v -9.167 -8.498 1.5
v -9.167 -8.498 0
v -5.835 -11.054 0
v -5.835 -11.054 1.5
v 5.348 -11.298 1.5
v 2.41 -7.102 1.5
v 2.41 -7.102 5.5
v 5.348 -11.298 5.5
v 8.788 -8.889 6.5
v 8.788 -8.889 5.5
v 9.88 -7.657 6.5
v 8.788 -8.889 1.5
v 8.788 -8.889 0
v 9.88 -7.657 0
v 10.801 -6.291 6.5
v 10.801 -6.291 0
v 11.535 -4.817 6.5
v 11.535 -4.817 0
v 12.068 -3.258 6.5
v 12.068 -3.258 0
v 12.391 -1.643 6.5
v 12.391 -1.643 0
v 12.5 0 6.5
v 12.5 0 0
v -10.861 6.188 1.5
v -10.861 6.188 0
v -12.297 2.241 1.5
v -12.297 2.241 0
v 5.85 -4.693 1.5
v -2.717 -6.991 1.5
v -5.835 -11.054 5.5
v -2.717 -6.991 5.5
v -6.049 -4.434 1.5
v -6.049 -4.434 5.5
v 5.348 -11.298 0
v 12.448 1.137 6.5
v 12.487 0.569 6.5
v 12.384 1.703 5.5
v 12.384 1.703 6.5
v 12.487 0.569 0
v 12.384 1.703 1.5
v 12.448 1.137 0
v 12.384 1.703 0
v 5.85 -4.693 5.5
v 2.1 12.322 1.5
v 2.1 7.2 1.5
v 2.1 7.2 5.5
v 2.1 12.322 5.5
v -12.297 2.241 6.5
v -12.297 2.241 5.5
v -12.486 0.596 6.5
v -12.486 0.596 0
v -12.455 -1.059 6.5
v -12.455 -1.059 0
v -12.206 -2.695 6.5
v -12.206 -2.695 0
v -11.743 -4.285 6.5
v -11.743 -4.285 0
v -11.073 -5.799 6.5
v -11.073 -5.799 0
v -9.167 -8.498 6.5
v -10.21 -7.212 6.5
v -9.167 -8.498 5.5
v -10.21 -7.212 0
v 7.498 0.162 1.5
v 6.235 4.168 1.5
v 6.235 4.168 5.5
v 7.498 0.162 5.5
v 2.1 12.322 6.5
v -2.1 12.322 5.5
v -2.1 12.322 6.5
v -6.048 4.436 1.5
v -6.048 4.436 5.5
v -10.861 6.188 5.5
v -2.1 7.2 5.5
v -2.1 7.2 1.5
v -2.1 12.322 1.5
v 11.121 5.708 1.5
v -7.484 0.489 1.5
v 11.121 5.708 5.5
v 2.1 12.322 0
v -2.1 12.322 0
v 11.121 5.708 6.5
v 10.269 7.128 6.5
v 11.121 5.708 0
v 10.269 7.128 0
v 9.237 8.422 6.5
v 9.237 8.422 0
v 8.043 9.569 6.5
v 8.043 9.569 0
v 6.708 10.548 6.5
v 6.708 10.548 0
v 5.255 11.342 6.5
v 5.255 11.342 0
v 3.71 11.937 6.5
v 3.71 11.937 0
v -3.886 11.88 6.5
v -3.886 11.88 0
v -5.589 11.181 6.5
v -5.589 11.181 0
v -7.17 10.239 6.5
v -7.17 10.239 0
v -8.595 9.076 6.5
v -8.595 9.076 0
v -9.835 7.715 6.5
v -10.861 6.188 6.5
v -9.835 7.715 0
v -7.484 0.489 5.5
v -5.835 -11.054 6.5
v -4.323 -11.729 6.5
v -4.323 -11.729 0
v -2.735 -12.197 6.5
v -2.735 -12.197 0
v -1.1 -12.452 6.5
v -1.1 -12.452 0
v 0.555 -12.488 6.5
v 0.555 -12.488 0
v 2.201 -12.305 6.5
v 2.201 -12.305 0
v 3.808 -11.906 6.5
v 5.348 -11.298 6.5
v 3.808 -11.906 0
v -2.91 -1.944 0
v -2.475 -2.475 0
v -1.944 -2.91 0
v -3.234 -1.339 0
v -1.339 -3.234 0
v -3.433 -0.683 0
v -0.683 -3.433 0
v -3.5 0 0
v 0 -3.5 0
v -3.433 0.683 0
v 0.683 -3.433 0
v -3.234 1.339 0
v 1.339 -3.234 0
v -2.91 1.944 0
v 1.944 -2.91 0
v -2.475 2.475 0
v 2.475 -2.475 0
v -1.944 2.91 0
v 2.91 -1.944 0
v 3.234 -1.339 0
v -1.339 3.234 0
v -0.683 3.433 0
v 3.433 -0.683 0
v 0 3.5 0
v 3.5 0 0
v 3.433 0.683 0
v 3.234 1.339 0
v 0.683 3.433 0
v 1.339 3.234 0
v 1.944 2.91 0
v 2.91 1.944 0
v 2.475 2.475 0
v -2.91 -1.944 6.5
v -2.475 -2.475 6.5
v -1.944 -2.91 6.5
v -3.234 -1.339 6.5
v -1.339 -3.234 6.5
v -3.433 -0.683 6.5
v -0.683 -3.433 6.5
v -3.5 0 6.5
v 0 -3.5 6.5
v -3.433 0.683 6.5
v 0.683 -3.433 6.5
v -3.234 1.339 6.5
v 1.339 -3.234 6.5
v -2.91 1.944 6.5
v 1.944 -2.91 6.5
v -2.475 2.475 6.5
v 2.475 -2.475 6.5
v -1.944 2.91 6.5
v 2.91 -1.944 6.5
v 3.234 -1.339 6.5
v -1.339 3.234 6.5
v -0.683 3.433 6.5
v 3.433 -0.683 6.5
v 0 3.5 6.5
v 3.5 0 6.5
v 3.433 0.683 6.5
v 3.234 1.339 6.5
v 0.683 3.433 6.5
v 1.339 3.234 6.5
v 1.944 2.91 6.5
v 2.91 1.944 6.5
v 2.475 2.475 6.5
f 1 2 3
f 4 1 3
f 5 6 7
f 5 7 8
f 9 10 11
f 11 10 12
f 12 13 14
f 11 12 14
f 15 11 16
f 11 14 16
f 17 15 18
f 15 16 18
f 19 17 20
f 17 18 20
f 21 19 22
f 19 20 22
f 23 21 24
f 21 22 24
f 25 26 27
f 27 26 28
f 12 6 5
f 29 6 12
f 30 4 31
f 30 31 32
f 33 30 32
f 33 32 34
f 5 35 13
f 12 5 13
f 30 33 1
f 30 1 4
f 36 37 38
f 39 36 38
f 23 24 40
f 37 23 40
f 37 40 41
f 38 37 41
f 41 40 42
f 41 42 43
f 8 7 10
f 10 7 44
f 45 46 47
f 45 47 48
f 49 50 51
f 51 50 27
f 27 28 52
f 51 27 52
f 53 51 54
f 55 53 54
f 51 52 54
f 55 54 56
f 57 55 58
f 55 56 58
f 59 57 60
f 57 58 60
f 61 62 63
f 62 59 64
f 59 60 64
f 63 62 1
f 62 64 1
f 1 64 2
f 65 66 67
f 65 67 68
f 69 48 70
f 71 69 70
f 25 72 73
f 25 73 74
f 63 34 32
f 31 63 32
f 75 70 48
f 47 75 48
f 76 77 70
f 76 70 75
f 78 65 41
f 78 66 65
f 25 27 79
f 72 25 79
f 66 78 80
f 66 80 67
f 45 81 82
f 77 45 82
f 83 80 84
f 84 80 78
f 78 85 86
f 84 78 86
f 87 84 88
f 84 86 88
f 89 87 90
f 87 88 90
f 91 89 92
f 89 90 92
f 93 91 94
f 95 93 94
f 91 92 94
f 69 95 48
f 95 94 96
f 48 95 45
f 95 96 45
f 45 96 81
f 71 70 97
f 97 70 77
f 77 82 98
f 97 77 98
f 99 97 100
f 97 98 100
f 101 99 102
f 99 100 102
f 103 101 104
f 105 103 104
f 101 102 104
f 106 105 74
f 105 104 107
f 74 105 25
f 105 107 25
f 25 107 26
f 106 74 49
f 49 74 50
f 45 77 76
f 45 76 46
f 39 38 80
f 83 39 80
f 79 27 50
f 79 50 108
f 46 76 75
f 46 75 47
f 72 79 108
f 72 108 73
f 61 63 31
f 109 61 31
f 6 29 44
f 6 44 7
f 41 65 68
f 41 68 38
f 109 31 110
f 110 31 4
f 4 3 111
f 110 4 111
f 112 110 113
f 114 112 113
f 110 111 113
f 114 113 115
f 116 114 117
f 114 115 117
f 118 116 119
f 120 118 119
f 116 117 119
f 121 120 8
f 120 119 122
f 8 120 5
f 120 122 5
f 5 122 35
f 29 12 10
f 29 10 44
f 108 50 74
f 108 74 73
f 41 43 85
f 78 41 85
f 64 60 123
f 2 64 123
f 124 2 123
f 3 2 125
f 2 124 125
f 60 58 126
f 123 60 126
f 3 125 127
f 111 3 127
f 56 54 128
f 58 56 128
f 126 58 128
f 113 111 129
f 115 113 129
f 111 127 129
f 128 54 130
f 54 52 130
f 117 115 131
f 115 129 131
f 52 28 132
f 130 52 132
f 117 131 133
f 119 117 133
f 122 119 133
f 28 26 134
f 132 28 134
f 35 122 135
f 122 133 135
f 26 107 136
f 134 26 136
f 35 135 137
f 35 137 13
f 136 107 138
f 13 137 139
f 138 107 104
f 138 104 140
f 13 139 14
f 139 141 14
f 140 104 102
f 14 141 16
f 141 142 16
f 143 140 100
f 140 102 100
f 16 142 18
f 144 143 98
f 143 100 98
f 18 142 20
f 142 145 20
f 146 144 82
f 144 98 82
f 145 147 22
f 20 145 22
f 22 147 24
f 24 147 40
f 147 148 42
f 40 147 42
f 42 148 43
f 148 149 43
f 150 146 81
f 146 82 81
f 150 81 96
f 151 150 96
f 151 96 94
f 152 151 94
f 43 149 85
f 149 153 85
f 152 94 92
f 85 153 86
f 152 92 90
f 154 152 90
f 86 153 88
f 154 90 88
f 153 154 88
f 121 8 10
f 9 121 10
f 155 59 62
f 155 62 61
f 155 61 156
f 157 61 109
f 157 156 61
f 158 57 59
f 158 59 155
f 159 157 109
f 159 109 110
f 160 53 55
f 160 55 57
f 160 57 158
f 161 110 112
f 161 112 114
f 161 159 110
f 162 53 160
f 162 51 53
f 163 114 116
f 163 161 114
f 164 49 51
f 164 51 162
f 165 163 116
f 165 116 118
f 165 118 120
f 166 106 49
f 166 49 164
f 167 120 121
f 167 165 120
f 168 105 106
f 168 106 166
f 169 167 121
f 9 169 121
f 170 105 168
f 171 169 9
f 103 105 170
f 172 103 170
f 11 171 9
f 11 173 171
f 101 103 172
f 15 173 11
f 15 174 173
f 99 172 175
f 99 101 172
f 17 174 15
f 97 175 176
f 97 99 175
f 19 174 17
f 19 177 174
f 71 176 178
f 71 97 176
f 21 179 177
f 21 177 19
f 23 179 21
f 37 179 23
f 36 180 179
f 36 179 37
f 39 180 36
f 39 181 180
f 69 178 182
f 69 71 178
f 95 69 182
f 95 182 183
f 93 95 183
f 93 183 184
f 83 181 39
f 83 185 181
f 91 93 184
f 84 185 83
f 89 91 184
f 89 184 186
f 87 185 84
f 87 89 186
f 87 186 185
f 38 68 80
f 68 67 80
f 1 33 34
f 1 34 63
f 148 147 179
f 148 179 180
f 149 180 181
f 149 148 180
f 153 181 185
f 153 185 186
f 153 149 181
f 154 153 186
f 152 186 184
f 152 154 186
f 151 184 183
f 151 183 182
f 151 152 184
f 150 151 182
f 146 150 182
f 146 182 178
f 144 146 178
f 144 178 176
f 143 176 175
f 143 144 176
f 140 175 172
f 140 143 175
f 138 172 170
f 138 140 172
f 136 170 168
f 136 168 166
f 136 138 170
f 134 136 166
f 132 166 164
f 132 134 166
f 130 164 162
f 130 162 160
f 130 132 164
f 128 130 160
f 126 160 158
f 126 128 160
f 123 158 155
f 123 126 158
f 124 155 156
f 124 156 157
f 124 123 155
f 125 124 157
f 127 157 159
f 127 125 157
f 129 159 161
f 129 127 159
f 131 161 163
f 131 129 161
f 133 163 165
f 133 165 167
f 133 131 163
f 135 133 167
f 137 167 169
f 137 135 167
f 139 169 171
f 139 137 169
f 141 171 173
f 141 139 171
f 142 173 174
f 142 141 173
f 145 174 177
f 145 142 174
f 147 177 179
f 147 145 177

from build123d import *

# Parameters (mm, degrees)
F0_R     = 3.5
F1_DEPTH = 6.5
F2_START = 1.5
F2_DEPTH = 4


with BuildPart() as f1:
    # F0 (on Top) → F1 (new body)
    with BuildSketch(Plane.XY):
        with BuildLine():
            Line((-9.1673866339, -8.4975892055), (-6.0491072211, -4.4337683552))
            ThreePointArc((-6.0491072211, -4.4337683552), (-7.2003739079, -2.0987176052), (-7.4840272858, 0.4892193627))
            Line((-7.4840272858, 0.4892193627), (-12.2974468195, 2.241160798))
            ThreePointArc((-12.2974468195, 2.241160798), (-12.0006231798, -3.4978626754), (-9.1673866339, -8.4975892055))
        make_face()
        with BuildLine():
            ThreePointArc((-6.0475616592, 4.4358762356), (-4.3018232726, 6.1436403322), (-2.0999722599, 7.2000080908))
            Line((-2.0999722599, 7.2000080908), (-2.0999722599, 12.3223421681))
            ThreePointArc((-2.0999722599, 12.3223421681), (-7.1697054544, 10.2394005536), (-10.8609811929, 6.1878176709))
            Line((-10.8609811929, 6.1878176709), (-6.0475616592, 4.4358762356))
        make_face()
        with BuildLine():
            ThreePointArc((2.0999722599, 7.2000080908), (4.4348223627, 6.048334532), (6.2352959244, 4.1678633297))
            Line((6.2352959244, 4.1678633297), (11.1205527613, 5.7081788938))
            ThreePointArc((11.1205527613, 5.7081788938), (7.3913706045, 10.0805575533), (2.0999722599, 12.3223421681))
            Line((2.0999722599, 12.3223421681), (2.0999722599, 7.2000080908))
        make_face()
        with BuildLine():
            ThreePointArc((7.4982435991, 0.1623050491), (7.4995608869, 0.0811572762), (7.5, 0))
            ThreePointArc((7.5, 0), (7.0754730103, -2.4875051115), (5.849951552, -4.6934067412))
            Line((5.849951552, -4.6934067412), (8.7880016779, -8.8893771722))
            ThreePointArc((8.7880016779, -8.8893771722), (11.5347306205, -4.8166367429), (12.5, 0))
            ThreePointArc((12.5, 0), (12.4708410993, 0.8533008116), (12.383500436, 1.7026206131))
            Line((12.383500436, 1.7026206131), (7.4982435991, 0.1623050491))
        make_face()
        with BuildLine():
            Line((5.3476085387, -11.2983663827), (2.4095584128, -7.1023959517))
            ThreePointArc((2.4095584128, -7.1023959517), (-0.1636116378, -7.4982152031), (-2.7170672074, -6.9905325828))
            Line((-2.7170672074, -6.9905325828), (-5.8353466201, -11.0543534331))
            ThreePointArc((-5.8353466201, -11.0543534331), (-0.2726860629, -12.4970253385), (5.3476085387, -11.2983663827))
        make_face()
        with BuildLine():
            ThreePointArc((-7.4840272858, 0.4892193627), (-7.0476946559, 2.5651510749), (-6.0475616592, 4.4358762356))
            Line((-6.0475616592, 4.4358762356), (-10.8609811929, 6.1878176709))
            Line((-10.8609811929, 6.1878176709), (-12.2974468195, 2.241160798))
            Line((-12.2974468195, 2.241160798), (-7.4840272858, 0.4892193627))
        make_face()
        with BuildLine():
            Line((8.7880016779, -8.8893771722), (5.849951552, -4.6934067412))
            ThreePointArc((5.849951552, -4.6934067412), (4.3018232726, -6.1436403322), (2.4095584128, -7.1023959517))
            Line((2.4095584128, -7.1023959517), (5.3476085387, -11.2983663827))
            Line((5.3476085387, -11.2983663827), (8.7880016779, -8.8893771722))
        make_face()
        with BuildLine():
            Line((-5.8353466201, -11.0543534331), (-2.7170672074, -6.9905325828))
            ThreePointArc((-2.7170672074, -6.9905325828), (-4.5657107176, -5.9501500522), (-6.0491072211, -4.4337683552))
            Line((-6.0491072211, -4.4337683552), (-9.1673866339, -8.4975892055))
            Line((-9.1673866339, -8.4975892055), (-5.8353466201, -11.0543534331))
        make_face()
        with BuildLine():
            Line((-7.4840272858, 0.4892193627), (-6.0475616592, 4.4358762356))
            ThreePointArc((-6.0475616592, 4.4358762356), (-7.0476946559, 2.5651510749), (-7.4840272858, 0.4892193627))
        make_face()
        with BuildLine():
            ThreePointArc((-2.0999722599, 7.2000080908), (0, 7.5), (2.0999722599, 7.2000080908))
            Line((2.0999722599, 7.2000080908), (2.0999722599, 12.3223421681))
            Line((2.0999722599, 12.3223421681), (-2.0999722599, 12.3223421681))
            Line((-2.0999722599, 12.3223421681), (-2.0999722599, 7.2000080908))
        make_face()
        with BuildLine():
            Line((-2.0999722599, 7.2000080908), (2.0999722599, 7.2000080908))
            ThreePointArc((2.0999722599, 7.2000080908), (0, 7.5), (-2.0999722599, 7.2000080908))
        make_face()
        with BuildLine():
            ThreePointArc((-6.0491072211, -4.4337683552), (-4.5657107176, -5.9501500522), (-2.7170672074, -6.9905325828))
            Line((-2.7170672074, -6.9905325828), (-6.0491072211, -4.4337683552))
        make_face()
        with BuildLine():
            ThreePointArc((5.849951552, -4.6934067412), (7.0754730103, -2.4875051115), (7.5, 0))
            ThreePointArc((7.5, 0), (7.4995608869, 0.0811572762), (7.4982435991, 0.1623050491))
            Line((7.4982435991, 0.1623050491), (6.2352959244, 4.1678633297))
            ThreePointArc((6.2352959244, 4.1678633297), (4.4348223627, 6.048334532), (2.0999722599, 7.2000080908))
            Line((2.0999722599, 7.2000080908), (-2.0999722599, 7.2000080908))
            ThreePointArc((-2.0999722599, 7.2000080908), (-4.3018232726, 6.1436403322), (-6.0475616592, 4.4358762356))
            Line((-6.0475616592, 4.4358762356), (-7.4840272858, 0.4892193627))
            ThreePointArc((-7.4840272858, 0.4892193627), (-7.2003739079, -2.0987176052), (-6.0491072211, -4.4337683552))
            Line((-6.0491072211, -4.4337683552), (-2.7170672074, -6.9905325828))
            ThreePointArc((-2.7170672074, -6.9905325828), (-0.1636116378, -7.4982152031), (2.4095584128, -7.1023959517))
            Line((2.4095584128, -7.1023959517), (5.849951552, -4.6934067412))
        make_face()
        Circle(F0_R, mode=Mode.SUBTRACT)
        with BuildLine():
            ThreePointArc((2.4095584128, -7.1023959517), (4.3018232726, -6.1436403322), (5.849951552, -4.6934067412))
            Line((5.849951552, -4.6934067412), (2.4095584128, -7.1023959517))
        make_face()
        with BuildLine():
            Line((6.2352959244, 4.1678633297), (7.4982435991, 0.1623050491))
            ThreePointArc((7.4982435991, 0.1623050491), (7.1528771306, 2.2552934963), (6.2352959244, 4.1678633297))
        make_face()
        with BuildLine():
            ThreePointArc((6.2352959244, 4.1678633297), (7.1528771306, 2.2552934963), (7.4982435991, 0.1623050491))
            Line((7.4982435991, 0.1623050491), (12.383500436, 1.7026206131))
            Line((12.383500436, 1.7026206131), (11.1205527613, 5.7081788938))
            Line((11.1205527613, 5.7081788938), (6.2352959244, 4.1678633297))
        make_face()
    extrude(amount=F1_DEPTH)

    # F0 (on Top) → F2 (cut)
    with BuildSketch(Plane.XY.offset(F2_START)):
        with BuildLine():
            Line((-5.8353466201, -11.0543534331), (-2.7170672074, -6.9905325828))
            ThreePointArc((-2.7170672074, -6.9905325828), (-4.5657107176, -5.9501500522), (-6.0491072211, -4.4337683552))
            Line((-6.0491072211, -4.4337683552), (-9.1673866339, -8.4975892055))
            Line((-9.1673866339, -8.4975892055), (-5.8353466201, -11.0543534331))
        make_face()
        with BuildLine():
            ThreePointArc((-6.0491072211, -4.4337683552), (-4.5657107176, -5.9501500522), (-2.7170672074, -6.9905325828))
            Line((-2.7170672074, -6.9905325828), (-6.0491072211, -4.4337683552))
        make_face()
        with BuildLine():
            ThreePointArc((-7.4840272858, 0.4892193627), (-7.0476946559, 2.5651510749), (-6.0475616592, 4.4358762356))
            Line((-6.0475616592, 4.4358762356), (-10.8609811929, 6.1878176709))
            Line((-10.8609811929, 6.1878176709), (-12.2974468195, 2.241160798))
            Line((-12.2974468195, 2.241160798), (-7.4840272858, 0.4892193627))
        make_face()
        with BuildLine():
            Line((-7.4840272858, 0.4892193627), (-6.0475616592, 4.4358762356))
            ThreePointArc((-6.0475616592, 4.4358762356), (-7.0476946559, 2.5651510749), (-7.4840272858, 0.4892193627))
        make_face()
        with BuildLine():
            ThreePointArc((-2.0999722599, 7.2000080908), (0, 7.5), (2.0999722599, 7.2000080908))
            Line((2.0999722599, 7.2000080908), (2.0999722599, 12.3223421681))
            Line((2.0999722599, 12.3223421681), (-2.0999722599, 12.3223421681))
            Line((-2.0999722599, 12.3223421681), (-2.0999722599, 7.2000080908))
        make_face()
        with BuildLine():
            Line((-2.0999722599, 7.2000080908), (2.0999722599, 7.2000080908))
            ThreePointArc((2.0999722599, 7.2000080908), (0, 7.5), (-2.0999722599, 7.2000080908))
        make_face()
        with BuildLine():
            ThreePointArc((6.2352959244, 4.1678633297), (7.1528771306, 2.2552934963), (7.4982435991, 0.1623050491))
            Line((7.4982435991, 0.1623050491), (12.383500436, 1.7026206131))
            Line((12.383500436, 1.7026206131), (11.1205527613, 5.7081788938))
            Line((11.1205527613, 5.7081788938), (6.2352959244, 4.1678633297))
        make_face()
        with BuildLine():
            Line((6.2352959244, 4.1678633297), (7.4982435991, 0.1623050491))
            ThreePointArc((7.4982435991, 0.1623050491), (7.1528771306, 2.2552934963), (6.2352959244, 4.1678633297))
        make_face()
        with BuildLine():
            Line((8.7880016779, -8.8893771722), (5.849951552, -4.6934067412))
            ThreePointArc((5.849951552, -4.6934067412), (4.3018232726, -6.1436403322), (2.4095584128, -7.1023959517))
            Line((2.4095584128, -7.1023959517), (5.3476085387, -11.2983663827))
            Line((5.3476085387, -11.2983663827), (8.7880016779, -8.8893771722))
        make_face()
        with BuildLine():
            ThreePointArc((2.4095584128, -7.1023959517), (4.3018232726, -6.1436403322), (5.849951552, -4.6934067412))
            Line((5.849951552, -4.6934067412), (2.4095584128, -7.1023959517))
        make_face()
    extrude(amount=F2_DEPTH, mode=Mode.SUBTRACT)


solid = f1.part
